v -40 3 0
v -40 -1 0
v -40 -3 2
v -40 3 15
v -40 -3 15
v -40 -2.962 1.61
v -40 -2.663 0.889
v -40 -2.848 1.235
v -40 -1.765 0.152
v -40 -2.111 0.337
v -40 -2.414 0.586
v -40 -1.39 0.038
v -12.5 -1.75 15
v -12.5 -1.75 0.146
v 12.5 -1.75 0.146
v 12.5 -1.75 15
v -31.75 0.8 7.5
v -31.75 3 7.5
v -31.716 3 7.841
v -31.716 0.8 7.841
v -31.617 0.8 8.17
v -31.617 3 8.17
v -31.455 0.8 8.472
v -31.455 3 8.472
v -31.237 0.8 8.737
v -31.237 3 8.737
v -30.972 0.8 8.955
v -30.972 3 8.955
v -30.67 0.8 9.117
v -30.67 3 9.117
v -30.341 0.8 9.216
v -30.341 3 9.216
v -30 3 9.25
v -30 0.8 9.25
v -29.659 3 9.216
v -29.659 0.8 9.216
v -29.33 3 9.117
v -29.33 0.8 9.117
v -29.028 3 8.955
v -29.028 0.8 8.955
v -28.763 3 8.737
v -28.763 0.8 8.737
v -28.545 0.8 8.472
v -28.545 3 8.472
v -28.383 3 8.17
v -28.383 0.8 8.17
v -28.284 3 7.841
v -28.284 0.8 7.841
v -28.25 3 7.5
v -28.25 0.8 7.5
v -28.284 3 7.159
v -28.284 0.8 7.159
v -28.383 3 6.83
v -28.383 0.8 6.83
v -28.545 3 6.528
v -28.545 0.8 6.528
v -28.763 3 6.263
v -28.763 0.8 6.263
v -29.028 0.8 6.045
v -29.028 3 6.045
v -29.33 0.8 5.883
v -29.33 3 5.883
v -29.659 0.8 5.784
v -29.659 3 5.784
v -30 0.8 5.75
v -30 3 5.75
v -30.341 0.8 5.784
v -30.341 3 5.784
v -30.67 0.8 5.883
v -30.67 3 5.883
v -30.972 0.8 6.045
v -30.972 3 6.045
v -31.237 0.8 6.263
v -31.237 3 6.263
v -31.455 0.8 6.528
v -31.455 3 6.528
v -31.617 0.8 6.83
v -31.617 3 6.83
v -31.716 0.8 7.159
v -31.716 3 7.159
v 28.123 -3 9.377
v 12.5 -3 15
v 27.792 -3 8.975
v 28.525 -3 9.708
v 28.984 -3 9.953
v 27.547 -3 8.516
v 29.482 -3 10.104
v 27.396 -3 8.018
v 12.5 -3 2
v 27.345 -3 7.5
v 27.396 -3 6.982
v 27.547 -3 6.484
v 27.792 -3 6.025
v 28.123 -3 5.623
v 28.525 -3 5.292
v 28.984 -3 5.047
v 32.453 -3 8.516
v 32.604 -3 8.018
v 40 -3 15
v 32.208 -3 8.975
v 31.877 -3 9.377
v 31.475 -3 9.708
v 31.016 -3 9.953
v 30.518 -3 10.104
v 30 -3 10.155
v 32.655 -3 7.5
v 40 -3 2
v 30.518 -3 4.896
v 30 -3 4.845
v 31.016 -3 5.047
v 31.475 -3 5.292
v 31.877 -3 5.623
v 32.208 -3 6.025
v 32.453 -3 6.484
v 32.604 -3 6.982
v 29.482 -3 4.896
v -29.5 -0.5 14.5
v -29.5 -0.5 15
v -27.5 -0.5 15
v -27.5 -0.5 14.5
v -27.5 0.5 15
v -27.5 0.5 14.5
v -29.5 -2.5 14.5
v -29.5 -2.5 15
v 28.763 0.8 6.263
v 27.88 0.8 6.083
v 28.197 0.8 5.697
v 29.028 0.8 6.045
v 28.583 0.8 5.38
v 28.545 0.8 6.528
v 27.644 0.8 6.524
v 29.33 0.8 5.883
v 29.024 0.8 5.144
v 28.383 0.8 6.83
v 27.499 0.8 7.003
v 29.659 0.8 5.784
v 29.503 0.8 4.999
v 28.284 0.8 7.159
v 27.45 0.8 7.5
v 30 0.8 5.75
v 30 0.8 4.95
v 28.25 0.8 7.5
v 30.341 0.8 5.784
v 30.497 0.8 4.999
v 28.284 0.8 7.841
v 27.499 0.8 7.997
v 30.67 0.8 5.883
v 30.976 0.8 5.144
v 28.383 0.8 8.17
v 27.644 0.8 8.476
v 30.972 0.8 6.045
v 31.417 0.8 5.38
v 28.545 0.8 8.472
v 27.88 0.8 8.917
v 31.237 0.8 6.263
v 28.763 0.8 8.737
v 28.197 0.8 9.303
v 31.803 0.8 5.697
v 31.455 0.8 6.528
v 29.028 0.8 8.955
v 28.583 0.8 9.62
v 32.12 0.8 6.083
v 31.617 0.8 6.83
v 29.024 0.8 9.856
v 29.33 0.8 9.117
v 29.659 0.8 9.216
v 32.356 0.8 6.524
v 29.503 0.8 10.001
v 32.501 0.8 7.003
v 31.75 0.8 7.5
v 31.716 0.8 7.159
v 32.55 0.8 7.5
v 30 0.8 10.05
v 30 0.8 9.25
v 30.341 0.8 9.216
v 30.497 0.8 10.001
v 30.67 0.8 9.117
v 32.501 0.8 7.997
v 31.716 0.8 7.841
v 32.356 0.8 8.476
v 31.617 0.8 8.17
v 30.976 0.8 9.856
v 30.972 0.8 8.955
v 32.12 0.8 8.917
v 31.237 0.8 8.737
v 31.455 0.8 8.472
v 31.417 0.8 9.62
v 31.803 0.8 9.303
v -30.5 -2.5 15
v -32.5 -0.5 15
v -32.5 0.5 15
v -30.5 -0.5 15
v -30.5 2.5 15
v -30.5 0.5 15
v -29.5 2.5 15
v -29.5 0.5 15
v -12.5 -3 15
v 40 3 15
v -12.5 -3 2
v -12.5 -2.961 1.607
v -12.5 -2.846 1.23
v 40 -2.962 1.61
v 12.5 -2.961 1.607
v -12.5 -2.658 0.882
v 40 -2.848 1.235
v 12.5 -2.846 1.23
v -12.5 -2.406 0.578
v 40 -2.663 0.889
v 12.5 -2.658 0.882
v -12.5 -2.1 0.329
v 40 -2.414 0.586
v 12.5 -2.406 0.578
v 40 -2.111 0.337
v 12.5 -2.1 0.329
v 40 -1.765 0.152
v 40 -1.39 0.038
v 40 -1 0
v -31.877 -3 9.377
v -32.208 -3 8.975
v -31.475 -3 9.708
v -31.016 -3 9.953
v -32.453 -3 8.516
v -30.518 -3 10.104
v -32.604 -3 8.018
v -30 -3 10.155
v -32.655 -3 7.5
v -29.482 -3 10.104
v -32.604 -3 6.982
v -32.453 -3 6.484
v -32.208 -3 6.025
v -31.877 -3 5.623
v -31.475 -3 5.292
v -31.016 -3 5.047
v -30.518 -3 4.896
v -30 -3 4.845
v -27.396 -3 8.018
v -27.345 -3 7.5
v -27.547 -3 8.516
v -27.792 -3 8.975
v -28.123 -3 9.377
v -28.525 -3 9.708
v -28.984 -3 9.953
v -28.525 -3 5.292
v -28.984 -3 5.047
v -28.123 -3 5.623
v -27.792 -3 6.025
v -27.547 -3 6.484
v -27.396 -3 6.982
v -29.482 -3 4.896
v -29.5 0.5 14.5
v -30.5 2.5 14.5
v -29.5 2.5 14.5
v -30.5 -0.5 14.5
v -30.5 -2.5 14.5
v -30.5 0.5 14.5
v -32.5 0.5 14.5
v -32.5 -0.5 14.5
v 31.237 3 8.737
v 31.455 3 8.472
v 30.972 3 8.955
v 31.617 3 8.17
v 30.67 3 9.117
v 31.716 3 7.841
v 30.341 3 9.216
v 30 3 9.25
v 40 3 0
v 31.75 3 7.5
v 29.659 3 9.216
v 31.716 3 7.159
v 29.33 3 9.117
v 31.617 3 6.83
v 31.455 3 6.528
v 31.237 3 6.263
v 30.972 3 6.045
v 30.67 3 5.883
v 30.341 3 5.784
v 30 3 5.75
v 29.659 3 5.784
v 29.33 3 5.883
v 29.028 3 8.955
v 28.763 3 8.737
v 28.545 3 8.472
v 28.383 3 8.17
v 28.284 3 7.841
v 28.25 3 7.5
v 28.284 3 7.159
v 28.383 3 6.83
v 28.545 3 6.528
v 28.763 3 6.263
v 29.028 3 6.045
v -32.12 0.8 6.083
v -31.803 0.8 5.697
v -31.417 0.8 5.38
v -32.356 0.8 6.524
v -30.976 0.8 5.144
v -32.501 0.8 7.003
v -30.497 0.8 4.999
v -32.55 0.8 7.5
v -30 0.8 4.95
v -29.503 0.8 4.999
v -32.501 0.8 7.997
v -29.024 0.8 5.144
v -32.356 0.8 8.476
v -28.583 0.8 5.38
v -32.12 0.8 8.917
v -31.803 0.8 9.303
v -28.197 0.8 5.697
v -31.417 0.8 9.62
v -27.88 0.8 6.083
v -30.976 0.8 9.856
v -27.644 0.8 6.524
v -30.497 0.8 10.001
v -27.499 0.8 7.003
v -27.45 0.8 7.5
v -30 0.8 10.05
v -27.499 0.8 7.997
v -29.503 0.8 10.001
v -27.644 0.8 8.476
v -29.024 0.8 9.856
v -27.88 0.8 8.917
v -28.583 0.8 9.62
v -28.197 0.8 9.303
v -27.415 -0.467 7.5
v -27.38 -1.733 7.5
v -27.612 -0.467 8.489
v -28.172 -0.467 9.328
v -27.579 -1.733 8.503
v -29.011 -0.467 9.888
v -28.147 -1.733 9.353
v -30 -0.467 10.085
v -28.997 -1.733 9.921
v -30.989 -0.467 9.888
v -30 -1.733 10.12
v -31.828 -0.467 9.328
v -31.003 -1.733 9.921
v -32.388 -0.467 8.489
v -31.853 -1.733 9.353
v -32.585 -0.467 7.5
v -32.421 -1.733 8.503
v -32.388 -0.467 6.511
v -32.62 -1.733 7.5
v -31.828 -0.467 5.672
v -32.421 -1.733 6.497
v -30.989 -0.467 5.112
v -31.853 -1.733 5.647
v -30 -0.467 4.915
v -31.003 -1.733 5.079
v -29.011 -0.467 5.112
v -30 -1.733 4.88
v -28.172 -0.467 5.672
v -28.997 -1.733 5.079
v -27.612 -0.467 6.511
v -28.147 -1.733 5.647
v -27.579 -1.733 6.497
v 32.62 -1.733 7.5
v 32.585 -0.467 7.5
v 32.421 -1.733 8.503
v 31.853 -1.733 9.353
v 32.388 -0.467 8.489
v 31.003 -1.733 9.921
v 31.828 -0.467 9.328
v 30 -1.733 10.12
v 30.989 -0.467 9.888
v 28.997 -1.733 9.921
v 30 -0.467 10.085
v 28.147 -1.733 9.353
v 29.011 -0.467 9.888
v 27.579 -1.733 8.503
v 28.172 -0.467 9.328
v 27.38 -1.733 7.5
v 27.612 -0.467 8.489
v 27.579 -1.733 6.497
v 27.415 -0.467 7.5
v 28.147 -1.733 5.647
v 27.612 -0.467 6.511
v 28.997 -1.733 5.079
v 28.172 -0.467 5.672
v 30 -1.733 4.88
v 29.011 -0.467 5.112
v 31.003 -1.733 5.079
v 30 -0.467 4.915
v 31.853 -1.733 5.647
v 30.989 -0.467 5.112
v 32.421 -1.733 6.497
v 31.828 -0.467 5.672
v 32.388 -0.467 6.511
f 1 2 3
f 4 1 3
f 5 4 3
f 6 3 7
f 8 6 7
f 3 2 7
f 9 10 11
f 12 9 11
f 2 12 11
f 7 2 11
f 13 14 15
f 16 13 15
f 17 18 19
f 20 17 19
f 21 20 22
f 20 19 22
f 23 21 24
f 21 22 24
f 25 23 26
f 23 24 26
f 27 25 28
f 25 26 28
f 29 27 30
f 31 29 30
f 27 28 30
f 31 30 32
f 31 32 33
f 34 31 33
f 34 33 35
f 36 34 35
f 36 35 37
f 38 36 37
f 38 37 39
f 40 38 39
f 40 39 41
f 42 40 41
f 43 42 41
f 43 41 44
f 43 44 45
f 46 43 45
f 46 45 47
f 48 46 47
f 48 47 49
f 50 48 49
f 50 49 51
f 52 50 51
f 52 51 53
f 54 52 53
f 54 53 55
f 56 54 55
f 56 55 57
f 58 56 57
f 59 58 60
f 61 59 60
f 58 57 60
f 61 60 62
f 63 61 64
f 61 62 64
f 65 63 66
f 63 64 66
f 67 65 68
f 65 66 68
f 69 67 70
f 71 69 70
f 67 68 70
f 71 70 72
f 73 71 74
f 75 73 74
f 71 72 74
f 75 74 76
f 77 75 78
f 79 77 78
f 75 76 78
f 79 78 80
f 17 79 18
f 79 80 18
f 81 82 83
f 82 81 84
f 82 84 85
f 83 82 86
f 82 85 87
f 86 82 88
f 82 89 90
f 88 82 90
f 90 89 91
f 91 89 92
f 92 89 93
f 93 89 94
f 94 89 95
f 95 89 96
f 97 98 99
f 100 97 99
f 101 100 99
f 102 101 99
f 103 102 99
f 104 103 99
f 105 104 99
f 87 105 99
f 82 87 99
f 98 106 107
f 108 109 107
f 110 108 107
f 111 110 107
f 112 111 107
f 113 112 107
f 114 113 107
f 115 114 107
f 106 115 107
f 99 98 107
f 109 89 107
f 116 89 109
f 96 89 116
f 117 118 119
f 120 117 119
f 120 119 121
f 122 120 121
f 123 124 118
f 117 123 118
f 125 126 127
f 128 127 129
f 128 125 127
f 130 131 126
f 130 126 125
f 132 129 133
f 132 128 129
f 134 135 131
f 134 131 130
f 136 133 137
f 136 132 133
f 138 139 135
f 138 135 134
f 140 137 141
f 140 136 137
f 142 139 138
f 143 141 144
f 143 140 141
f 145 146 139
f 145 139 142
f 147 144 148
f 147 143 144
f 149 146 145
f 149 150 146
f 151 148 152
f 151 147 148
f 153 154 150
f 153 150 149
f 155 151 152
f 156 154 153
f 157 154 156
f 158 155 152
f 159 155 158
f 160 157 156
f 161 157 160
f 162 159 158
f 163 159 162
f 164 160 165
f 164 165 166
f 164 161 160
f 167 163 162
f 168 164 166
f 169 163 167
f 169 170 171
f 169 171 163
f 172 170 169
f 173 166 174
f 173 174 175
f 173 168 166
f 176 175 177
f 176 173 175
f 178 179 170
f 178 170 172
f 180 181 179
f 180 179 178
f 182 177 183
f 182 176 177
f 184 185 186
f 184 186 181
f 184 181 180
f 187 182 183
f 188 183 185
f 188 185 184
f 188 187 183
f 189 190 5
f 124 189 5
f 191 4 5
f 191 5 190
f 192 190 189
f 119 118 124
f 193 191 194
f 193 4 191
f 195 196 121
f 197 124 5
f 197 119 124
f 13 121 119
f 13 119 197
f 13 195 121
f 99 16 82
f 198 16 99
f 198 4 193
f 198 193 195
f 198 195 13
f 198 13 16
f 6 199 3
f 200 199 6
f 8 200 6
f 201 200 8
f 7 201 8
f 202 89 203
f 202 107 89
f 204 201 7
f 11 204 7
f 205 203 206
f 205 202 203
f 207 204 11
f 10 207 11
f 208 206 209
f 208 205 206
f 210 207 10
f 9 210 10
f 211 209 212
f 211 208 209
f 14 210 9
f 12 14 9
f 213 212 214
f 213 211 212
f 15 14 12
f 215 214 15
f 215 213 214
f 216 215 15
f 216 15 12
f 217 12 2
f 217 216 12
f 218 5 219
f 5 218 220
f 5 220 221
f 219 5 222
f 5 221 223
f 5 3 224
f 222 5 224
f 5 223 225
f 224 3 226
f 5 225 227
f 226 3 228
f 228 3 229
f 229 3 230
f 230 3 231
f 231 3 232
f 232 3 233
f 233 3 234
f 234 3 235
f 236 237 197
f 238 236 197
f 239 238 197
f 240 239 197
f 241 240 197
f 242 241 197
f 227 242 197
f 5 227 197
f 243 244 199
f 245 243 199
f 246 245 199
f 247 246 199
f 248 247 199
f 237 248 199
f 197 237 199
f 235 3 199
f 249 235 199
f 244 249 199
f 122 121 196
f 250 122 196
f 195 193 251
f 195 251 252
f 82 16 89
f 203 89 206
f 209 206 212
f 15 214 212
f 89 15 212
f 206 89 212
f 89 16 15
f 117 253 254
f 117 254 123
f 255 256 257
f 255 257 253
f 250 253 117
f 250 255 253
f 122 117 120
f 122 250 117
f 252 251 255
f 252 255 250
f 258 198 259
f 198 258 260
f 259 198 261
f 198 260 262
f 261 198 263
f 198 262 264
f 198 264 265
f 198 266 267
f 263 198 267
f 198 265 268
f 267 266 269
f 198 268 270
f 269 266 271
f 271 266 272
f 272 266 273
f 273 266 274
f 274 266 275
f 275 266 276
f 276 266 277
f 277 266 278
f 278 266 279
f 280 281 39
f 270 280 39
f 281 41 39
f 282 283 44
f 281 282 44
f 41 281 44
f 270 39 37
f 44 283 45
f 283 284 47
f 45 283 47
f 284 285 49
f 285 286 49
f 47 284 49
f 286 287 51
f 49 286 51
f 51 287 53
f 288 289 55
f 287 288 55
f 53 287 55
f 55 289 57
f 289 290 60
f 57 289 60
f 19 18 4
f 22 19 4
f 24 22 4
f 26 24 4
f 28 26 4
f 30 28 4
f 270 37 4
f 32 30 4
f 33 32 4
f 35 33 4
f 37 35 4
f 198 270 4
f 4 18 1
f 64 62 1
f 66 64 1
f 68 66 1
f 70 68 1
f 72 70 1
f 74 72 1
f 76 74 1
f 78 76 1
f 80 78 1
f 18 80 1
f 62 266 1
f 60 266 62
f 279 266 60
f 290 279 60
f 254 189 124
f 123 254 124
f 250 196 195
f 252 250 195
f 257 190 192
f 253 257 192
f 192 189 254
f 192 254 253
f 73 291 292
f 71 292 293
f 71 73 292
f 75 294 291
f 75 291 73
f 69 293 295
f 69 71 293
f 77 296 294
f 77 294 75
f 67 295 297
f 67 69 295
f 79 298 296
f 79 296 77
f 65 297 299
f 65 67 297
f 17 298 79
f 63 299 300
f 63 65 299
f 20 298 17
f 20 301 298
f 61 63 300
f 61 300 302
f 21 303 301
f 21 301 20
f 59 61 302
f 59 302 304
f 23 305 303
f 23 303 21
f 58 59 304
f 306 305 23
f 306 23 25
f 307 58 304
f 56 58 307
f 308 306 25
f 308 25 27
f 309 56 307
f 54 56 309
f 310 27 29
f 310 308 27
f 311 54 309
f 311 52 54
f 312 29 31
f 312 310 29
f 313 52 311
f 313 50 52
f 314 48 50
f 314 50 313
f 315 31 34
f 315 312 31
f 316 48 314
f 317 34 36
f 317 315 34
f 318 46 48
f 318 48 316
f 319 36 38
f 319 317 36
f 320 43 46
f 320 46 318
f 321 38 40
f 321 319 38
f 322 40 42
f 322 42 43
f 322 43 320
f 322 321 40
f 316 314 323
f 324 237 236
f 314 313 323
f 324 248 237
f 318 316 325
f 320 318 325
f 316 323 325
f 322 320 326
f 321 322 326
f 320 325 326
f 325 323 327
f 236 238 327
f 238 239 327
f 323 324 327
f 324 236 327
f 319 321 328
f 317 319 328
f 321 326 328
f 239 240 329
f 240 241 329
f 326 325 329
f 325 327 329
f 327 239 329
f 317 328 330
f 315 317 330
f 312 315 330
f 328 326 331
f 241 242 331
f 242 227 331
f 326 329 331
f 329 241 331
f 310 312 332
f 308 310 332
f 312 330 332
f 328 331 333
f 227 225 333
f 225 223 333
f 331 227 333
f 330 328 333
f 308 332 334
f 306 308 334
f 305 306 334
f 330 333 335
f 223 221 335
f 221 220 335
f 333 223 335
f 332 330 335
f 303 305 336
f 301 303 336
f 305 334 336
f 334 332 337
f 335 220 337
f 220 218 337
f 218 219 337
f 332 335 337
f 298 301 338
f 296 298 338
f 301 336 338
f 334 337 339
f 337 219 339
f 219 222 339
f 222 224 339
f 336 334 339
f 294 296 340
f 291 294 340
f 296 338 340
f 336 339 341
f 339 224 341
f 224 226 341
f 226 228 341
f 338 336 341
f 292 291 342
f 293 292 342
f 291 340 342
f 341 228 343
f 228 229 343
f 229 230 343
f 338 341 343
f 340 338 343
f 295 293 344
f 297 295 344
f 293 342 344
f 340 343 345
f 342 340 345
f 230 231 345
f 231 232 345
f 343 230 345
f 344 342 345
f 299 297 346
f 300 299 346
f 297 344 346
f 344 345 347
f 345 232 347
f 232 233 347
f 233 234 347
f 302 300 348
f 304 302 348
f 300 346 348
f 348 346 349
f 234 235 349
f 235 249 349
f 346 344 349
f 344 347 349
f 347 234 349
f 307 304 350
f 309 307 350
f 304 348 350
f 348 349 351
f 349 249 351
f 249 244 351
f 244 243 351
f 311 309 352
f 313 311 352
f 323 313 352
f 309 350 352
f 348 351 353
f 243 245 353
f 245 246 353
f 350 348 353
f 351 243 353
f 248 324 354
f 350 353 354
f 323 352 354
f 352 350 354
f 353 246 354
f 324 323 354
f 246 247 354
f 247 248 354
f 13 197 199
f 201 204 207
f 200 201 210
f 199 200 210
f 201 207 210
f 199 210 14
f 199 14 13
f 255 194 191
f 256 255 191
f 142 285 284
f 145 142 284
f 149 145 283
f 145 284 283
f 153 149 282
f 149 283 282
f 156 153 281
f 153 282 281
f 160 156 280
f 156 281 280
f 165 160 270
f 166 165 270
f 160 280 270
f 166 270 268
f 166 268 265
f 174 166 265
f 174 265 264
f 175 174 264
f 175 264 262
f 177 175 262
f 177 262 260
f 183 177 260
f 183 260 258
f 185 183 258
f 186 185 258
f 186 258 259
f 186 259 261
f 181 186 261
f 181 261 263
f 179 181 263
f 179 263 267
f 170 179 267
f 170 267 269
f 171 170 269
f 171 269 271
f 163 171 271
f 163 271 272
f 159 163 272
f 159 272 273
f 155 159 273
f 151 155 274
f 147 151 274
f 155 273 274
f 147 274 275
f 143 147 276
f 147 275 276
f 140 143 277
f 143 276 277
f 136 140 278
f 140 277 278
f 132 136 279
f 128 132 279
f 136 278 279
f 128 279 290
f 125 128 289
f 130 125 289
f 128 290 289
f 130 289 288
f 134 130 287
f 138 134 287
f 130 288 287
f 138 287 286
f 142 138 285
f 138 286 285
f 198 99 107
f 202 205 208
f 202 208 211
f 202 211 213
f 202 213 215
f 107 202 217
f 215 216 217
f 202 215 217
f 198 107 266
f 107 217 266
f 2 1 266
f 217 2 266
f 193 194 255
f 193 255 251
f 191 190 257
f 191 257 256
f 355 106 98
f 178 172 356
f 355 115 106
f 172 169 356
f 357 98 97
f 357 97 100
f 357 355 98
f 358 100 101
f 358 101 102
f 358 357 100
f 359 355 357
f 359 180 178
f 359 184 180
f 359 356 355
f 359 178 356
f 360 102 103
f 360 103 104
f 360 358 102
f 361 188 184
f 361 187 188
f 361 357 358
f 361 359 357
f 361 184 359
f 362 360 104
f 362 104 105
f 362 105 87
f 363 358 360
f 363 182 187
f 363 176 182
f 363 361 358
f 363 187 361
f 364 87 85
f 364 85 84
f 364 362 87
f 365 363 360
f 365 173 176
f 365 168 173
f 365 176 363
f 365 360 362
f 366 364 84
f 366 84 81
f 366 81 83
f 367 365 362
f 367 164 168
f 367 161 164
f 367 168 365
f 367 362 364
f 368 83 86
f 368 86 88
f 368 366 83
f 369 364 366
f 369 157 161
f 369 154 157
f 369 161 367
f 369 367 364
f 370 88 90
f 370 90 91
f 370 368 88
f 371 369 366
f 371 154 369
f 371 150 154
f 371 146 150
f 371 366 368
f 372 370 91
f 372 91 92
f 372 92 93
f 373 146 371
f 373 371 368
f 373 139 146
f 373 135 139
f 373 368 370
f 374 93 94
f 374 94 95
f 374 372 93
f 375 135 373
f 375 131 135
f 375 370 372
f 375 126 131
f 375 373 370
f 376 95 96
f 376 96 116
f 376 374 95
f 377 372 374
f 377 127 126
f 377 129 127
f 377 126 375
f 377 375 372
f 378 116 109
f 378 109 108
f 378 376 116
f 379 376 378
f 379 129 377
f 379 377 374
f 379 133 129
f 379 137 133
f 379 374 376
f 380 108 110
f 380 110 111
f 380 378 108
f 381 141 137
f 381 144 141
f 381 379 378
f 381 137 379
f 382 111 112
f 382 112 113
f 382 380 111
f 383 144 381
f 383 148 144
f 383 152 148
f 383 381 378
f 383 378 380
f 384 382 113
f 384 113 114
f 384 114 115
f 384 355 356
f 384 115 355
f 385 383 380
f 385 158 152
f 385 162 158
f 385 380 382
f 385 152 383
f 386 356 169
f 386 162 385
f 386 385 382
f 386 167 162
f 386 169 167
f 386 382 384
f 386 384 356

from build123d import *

# Parameters (mm, degrees)
F1_DEPTH  = 15
F4_R      = 2.55
F2_R      = 2.655
F7_D      = 3.5
F8_F1_R   = 2
F9_W      = 2
F9_H      = 1
F9_W_2    = 1
F9_H_2    = 2
F10_DEPTH = 0.5


with BuildPart() as f1:
    # F0 (on Top) → F1 (new body)
    with BuildSketch(Plane.XY):
        Polygon((12.5, -3), (40, -3), (40, 3), (-40, 3), (-40, -3), (-12.5, -3), (-12.5, -1.75), (12.5, -1.75), align=None)
    extrude(amount=F1_DEPTH)

    # F4 (on offset) → F5 section 0
    with BuildSketch(Plane.XZ.offset(-0.8)):
        with Locations((-30, 7.5)):
            Circle(F4_R)
    # F2 (on face) → F5 section 1
    with BuildSketch(Plane.XZ.offset(3)):
        with Locations((-30, 7.5)):
            Circle(F2_R)
    loft(mode=Mode.SUBTRACT)

    # F2 (on face) → F6 section 0
    with BuildSketch(Plane.XZ.offset(3)):
        with Locations((30, 7.5)):
            Circle(F2_R)
    # F4 (on offset) → F6 section 1
    with BuildSketch(Plane.XZ.offset(-0.8)):
        with Locations((30, 7.5)):
            Circle(F4_R)
    loft(mode=Mode.SUBTRACT)

    # F7 (through all)
    with Locations(Plane.XZ.offset(-0.8)):
        with Locations((30, 7.5), (-30, 7.5)):
            Hole(F7_D / 2)

    # F8: fillet of radius 2 on 2 edges, made by hand

    # F8_f1
    f8_f1_edges = [f1.edges().sort_by_distance(p)[0] for p in [
        (26.25, -3, 0),
    ]]
    fillet(f8_f1_edges, radius=F8_F1_R)

    # F9 (on face) → F10 (cut)
    with BuildSketch(Plane.XY.offset(15)):
        with Locations((-31.5, 0)):
            Rectangle(F9_W, F9_H)
        with Locations((-30, 0)):
            Rectangle(F9_W_2, F9_H)
        with Locations((-28.5, 0)):
            Rectangle(F9_W, F9_H)
        with Locations((-30, 1.5)):
            Rectangle(F9_W_2, F9_H_2)
        with Locations((-30, -1.5)):
            Rectangle(F9_W_2, F9_H_2)
    extrude(amount=-F10_DEPTH, mode=Mode.SUBTRACT)


solid = f1.part
